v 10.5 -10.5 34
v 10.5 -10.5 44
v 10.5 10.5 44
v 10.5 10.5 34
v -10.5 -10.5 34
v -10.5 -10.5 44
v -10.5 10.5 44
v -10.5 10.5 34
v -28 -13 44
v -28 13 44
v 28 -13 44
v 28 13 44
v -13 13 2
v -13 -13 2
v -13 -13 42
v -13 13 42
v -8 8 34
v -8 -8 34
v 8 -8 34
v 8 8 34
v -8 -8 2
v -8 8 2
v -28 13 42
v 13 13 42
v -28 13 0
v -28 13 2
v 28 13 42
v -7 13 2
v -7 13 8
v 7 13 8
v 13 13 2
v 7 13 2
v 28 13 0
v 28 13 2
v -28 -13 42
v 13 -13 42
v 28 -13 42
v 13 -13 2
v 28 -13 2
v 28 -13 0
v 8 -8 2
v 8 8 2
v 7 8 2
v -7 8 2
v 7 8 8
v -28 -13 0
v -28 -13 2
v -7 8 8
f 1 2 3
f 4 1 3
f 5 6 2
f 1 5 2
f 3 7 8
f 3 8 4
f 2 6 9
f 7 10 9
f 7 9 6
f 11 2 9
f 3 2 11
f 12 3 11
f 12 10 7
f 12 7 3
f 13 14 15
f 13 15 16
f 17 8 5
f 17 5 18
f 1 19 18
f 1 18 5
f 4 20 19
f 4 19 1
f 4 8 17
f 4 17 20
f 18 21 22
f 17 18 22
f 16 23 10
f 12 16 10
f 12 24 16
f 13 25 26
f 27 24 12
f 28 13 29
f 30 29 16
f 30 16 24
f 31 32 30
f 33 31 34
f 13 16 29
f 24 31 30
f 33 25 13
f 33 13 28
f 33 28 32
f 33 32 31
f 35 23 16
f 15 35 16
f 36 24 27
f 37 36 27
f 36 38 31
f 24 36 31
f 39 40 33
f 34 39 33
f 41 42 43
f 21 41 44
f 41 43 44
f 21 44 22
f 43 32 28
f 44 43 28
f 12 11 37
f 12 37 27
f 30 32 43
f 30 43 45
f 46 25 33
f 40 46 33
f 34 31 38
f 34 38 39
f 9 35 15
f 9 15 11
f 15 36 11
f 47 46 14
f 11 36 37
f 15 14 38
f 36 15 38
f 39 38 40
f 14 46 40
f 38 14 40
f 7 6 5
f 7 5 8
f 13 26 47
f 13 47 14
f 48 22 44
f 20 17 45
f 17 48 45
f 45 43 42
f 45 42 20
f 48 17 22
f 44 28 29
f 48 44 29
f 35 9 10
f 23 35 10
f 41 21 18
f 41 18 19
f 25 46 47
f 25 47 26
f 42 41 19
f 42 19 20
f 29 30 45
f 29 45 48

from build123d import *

# Parameters (mm, degrees)
F0_W      = 26
F0_H      = 26
F0_W_2    = 16
F0_H_2    = 16
F1_DEPTH  = 2
F2_DEPTH  = 40
F3_W      = 26
F3_H      = 26
F3_W_2    = 18
F3_H_2    = 18
F4_DEPTH  = 4
F7_W      = 14
F7_H      = 6
F8_DEPTH  = 15.3
F9_W      = 15
F9_H      = 26
F10_DEPTH = 2
F11_W     = 15
F11_H     = 26
F12_DEPTH = 2
F13_W     = 21
F13_H     = 21
F14_DEPTH = 10


with BuildPart() as f1:
    # F0 (on Top) → F1 (new body)
    with BuildSketch(Plane.XY):
        Rectangle(F0_W, F0_H)
        Rectangle(F0_W_2, F0_H_2, mode=Mode.SUBTRACT)
        Rectangle(F0_W_2, F0_H_2)
    extrude(amount=F1_DEPTH)

    # F0 (on Top) → F2 (join)
    with BuildSketch(Plane.XY):
        Rectangle(F0_W, F0_H)
        Rectangle(F0_W_2, F0_H_2, mode=Mode.SUBTRACT)
    extrude(amount=F2_DEPTH)

    # F3 (on face) → F4 (join)
    with BuildSketch(Plane.XY.offset(40)):
        Rectangle(F3_W, F3_H)
        Rectangle(F3_W_2, F3_H_2, mode=Mode.SUBTRACT)
    extrude(amount=F4_DEPTH)

    # F7 (on face) → F8 (cut)
    with BuildSketch(Plane(origin=(0, 13, 0), x_dir=(-1, 0, 0), z_dir=(0, 1, 0))):
        with Locations((0, 5)):
            Rectangle(F7_W, F7_H)
    extrude(amount=-F8_DEPTH, mode=Mode.SUBTRACT)

    # F9 (on face) → F10 (join)
    with BuildSketch(Plane.XY.offset(44)):
        with Locations((-20.5, 0)):
            Rectangle(F9_W, F9_H)
        with Locations((20.5, 0)):
            Rectangle(F9_W, F9_H)
    extrude(amount=-F10_DEPTH)

    # F11 (on face) → F12 (join)
    with BuildSketch(Plane.XY):
        with Locations((-20.5, 0)):
            Rectangle(F11_W, F11_H)
        with Locations((20.5, 0)):
            Rectangle(F11_W, F11_H)
    extrude(amount=F12_DEPTH)

    # F13 (on face) → F14 (cut)
    with BuildSketch(Plane.XY.offset(44)):
        Rectangle(F13_W, F13_H)
    extrude(amount=-F14_DEPTH, mode=Mode.SUBTRACT)


solid = f1.part
